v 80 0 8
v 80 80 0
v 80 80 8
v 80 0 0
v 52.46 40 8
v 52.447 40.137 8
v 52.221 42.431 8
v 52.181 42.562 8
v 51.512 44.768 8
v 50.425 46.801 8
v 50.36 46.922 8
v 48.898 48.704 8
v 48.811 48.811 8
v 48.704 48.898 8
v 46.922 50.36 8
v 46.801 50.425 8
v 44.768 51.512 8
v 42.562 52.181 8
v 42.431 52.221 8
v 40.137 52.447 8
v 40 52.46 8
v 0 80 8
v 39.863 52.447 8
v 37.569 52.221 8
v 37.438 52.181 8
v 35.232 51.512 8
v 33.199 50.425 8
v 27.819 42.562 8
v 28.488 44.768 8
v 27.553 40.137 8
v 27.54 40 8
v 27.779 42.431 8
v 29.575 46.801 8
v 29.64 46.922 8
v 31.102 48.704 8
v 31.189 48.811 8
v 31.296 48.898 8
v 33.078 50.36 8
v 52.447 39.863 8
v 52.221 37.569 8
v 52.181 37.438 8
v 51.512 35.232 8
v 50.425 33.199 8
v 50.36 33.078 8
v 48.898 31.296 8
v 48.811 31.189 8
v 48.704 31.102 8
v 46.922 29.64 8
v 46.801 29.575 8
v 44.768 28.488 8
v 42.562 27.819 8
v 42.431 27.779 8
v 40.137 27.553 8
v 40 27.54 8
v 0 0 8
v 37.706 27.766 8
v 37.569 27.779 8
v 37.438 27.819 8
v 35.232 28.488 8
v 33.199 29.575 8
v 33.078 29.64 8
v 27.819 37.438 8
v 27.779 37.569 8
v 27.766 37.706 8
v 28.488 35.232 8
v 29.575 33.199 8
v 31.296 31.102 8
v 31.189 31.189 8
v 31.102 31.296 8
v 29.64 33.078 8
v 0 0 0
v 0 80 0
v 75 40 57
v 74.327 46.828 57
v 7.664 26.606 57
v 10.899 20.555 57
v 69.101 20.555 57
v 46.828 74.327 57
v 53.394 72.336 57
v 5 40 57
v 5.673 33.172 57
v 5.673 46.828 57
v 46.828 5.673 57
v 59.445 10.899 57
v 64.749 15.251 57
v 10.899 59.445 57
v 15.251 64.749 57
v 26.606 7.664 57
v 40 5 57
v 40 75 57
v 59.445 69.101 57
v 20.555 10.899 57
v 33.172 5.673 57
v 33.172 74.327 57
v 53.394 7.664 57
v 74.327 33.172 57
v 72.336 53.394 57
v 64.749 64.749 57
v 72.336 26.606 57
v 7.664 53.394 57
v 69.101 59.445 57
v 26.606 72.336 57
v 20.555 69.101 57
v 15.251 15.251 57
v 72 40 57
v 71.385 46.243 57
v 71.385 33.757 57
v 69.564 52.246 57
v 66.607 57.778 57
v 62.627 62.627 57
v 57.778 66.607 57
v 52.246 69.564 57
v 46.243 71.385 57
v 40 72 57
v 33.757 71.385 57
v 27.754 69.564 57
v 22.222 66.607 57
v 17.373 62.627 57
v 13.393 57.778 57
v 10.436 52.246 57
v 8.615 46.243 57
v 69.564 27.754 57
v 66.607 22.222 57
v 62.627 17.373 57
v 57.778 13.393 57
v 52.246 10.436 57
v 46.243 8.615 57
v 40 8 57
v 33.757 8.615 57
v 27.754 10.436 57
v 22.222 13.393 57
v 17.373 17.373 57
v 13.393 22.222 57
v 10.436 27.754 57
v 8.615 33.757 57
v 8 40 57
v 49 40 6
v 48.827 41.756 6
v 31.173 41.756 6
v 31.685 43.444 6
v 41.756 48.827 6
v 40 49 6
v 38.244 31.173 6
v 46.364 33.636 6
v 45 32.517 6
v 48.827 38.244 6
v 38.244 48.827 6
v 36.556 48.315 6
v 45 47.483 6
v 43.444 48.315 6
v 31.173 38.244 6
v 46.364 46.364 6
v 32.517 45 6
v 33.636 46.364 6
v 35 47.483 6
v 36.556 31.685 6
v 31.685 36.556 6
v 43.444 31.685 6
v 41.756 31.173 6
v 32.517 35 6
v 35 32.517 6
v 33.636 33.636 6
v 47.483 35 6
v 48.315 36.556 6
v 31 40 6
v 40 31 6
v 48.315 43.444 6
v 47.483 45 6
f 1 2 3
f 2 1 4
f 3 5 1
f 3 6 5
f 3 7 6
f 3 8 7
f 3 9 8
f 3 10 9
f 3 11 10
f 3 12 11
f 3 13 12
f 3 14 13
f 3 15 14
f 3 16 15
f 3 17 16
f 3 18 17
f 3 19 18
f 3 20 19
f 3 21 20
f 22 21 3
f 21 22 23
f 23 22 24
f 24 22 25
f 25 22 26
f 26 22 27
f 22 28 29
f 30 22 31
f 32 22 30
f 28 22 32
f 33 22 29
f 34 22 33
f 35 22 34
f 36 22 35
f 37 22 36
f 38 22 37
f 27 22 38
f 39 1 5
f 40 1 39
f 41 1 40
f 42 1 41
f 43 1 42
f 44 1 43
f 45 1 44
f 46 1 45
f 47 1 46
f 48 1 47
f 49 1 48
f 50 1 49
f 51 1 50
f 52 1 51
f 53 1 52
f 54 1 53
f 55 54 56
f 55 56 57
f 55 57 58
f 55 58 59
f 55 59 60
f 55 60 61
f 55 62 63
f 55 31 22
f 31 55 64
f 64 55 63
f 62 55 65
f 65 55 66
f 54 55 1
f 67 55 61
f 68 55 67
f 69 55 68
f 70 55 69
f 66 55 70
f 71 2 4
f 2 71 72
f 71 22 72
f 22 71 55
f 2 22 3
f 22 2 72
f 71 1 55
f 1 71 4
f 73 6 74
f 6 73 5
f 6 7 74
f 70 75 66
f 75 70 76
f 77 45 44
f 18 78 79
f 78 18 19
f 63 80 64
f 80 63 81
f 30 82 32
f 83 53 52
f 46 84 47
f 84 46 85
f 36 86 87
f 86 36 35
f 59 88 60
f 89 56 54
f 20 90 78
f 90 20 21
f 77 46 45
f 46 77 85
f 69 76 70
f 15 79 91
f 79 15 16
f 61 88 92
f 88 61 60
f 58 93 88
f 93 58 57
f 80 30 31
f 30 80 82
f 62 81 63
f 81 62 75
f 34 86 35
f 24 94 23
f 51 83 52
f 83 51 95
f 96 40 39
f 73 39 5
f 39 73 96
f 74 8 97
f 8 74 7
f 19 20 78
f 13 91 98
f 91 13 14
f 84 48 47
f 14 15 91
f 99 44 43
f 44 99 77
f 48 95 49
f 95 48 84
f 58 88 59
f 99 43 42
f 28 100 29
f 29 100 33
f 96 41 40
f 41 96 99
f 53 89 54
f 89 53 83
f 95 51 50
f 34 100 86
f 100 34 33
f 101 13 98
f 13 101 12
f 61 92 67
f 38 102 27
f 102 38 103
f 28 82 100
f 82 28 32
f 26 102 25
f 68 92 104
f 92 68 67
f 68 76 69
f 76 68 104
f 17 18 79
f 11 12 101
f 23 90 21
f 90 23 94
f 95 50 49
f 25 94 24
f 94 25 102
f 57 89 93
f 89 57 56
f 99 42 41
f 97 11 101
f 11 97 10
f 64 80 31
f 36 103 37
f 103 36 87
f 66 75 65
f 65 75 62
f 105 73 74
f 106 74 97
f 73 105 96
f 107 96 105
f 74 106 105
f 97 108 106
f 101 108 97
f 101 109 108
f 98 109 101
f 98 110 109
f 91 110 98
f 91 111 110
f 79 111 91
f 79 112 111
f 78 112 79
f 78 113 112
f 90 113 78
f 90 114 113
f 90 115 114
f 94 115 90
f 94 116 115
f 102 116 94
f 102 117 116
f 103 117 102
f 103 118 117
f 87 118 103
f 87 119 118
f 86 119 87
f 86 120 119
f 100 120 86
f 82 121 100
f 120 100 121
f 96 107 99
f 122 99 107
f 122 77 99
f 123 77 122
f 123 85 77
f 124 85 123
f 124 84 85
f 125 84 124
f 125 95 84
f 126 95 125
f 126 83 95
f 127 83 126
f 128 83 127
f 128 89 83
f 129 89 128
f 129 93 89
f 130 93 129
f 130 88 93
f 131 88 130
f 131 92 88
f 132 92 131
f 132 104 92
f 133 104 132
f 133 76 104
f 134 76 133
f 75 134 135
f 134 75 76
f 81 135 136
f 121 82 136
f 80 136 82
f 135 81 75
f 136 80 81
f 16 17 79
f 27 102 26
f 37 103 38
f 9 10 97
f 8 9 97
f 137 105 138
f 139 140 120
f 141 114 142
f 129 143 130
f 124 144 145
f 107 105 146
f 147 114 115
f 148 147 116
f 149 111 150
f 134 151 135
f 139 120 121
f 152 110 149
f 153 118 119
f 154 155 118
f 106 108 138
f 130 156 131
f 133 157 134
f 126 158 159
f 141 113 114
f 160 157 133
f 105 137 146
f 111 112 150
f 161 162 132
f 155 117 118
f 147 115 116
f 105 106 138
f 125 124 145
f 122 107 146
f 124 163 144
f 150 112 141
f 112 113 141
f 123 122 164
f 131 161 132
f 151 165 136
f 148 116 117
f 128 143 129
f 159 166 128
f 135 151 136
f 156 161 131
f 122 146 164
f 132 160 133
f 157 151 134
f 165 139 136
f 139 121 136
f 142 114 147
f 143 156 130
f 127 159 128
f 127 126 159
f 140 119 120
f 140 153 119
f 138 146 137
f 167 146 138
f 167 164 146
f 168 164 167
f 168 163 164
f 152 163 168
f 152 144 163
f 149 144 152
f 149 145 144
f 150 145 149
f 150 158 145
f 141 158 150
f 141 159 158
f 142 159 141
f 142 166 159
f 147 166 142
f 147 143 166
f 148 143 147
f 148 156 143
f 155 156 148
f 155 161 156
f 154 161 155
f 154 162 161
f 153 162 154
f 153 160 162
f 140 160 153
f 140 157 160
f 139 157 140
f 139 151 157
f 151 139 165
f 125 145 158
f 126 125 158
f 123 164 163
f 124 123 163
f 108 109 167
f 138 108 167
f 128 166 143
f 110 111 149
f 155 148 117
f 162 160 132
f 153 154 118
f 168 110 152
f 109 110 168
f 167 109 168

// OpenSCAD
$fn = 32;

// ----------------------------------------------------------------------
// Hopper: funnel with square flange
// ----------------------------------------------------------------------

// --- parameters (mm) ---
fl = 80;                  // flange side, X and Y
fl_t = 8;                 // flange thickness
cone_h = 50;              // cone height above the flange
top_d = 70;               // cone mouth diameter
bot_d = 24;               // cone spout diameter
wall = 3;                 // cone wall thickness

bore_d = bot_d - 2 * wall;  // spout bore diameter
total_h = fl_t + cone_h - 1;  // overall height

difference() {
  union() {
    cube([fl, fl, fl_t]);
    translate([fl / 2, fl / 2, fl_t - 1])
      cylinder(h = cone_h, d1 = bot_d, d2 = top_d);
  }
  translate([fl / 2, fl / 2, fl_t - 2])
    cylinder(h = cone_h + 1, d1 = bore_d, d2 = top_d - 2 * wall);
}
